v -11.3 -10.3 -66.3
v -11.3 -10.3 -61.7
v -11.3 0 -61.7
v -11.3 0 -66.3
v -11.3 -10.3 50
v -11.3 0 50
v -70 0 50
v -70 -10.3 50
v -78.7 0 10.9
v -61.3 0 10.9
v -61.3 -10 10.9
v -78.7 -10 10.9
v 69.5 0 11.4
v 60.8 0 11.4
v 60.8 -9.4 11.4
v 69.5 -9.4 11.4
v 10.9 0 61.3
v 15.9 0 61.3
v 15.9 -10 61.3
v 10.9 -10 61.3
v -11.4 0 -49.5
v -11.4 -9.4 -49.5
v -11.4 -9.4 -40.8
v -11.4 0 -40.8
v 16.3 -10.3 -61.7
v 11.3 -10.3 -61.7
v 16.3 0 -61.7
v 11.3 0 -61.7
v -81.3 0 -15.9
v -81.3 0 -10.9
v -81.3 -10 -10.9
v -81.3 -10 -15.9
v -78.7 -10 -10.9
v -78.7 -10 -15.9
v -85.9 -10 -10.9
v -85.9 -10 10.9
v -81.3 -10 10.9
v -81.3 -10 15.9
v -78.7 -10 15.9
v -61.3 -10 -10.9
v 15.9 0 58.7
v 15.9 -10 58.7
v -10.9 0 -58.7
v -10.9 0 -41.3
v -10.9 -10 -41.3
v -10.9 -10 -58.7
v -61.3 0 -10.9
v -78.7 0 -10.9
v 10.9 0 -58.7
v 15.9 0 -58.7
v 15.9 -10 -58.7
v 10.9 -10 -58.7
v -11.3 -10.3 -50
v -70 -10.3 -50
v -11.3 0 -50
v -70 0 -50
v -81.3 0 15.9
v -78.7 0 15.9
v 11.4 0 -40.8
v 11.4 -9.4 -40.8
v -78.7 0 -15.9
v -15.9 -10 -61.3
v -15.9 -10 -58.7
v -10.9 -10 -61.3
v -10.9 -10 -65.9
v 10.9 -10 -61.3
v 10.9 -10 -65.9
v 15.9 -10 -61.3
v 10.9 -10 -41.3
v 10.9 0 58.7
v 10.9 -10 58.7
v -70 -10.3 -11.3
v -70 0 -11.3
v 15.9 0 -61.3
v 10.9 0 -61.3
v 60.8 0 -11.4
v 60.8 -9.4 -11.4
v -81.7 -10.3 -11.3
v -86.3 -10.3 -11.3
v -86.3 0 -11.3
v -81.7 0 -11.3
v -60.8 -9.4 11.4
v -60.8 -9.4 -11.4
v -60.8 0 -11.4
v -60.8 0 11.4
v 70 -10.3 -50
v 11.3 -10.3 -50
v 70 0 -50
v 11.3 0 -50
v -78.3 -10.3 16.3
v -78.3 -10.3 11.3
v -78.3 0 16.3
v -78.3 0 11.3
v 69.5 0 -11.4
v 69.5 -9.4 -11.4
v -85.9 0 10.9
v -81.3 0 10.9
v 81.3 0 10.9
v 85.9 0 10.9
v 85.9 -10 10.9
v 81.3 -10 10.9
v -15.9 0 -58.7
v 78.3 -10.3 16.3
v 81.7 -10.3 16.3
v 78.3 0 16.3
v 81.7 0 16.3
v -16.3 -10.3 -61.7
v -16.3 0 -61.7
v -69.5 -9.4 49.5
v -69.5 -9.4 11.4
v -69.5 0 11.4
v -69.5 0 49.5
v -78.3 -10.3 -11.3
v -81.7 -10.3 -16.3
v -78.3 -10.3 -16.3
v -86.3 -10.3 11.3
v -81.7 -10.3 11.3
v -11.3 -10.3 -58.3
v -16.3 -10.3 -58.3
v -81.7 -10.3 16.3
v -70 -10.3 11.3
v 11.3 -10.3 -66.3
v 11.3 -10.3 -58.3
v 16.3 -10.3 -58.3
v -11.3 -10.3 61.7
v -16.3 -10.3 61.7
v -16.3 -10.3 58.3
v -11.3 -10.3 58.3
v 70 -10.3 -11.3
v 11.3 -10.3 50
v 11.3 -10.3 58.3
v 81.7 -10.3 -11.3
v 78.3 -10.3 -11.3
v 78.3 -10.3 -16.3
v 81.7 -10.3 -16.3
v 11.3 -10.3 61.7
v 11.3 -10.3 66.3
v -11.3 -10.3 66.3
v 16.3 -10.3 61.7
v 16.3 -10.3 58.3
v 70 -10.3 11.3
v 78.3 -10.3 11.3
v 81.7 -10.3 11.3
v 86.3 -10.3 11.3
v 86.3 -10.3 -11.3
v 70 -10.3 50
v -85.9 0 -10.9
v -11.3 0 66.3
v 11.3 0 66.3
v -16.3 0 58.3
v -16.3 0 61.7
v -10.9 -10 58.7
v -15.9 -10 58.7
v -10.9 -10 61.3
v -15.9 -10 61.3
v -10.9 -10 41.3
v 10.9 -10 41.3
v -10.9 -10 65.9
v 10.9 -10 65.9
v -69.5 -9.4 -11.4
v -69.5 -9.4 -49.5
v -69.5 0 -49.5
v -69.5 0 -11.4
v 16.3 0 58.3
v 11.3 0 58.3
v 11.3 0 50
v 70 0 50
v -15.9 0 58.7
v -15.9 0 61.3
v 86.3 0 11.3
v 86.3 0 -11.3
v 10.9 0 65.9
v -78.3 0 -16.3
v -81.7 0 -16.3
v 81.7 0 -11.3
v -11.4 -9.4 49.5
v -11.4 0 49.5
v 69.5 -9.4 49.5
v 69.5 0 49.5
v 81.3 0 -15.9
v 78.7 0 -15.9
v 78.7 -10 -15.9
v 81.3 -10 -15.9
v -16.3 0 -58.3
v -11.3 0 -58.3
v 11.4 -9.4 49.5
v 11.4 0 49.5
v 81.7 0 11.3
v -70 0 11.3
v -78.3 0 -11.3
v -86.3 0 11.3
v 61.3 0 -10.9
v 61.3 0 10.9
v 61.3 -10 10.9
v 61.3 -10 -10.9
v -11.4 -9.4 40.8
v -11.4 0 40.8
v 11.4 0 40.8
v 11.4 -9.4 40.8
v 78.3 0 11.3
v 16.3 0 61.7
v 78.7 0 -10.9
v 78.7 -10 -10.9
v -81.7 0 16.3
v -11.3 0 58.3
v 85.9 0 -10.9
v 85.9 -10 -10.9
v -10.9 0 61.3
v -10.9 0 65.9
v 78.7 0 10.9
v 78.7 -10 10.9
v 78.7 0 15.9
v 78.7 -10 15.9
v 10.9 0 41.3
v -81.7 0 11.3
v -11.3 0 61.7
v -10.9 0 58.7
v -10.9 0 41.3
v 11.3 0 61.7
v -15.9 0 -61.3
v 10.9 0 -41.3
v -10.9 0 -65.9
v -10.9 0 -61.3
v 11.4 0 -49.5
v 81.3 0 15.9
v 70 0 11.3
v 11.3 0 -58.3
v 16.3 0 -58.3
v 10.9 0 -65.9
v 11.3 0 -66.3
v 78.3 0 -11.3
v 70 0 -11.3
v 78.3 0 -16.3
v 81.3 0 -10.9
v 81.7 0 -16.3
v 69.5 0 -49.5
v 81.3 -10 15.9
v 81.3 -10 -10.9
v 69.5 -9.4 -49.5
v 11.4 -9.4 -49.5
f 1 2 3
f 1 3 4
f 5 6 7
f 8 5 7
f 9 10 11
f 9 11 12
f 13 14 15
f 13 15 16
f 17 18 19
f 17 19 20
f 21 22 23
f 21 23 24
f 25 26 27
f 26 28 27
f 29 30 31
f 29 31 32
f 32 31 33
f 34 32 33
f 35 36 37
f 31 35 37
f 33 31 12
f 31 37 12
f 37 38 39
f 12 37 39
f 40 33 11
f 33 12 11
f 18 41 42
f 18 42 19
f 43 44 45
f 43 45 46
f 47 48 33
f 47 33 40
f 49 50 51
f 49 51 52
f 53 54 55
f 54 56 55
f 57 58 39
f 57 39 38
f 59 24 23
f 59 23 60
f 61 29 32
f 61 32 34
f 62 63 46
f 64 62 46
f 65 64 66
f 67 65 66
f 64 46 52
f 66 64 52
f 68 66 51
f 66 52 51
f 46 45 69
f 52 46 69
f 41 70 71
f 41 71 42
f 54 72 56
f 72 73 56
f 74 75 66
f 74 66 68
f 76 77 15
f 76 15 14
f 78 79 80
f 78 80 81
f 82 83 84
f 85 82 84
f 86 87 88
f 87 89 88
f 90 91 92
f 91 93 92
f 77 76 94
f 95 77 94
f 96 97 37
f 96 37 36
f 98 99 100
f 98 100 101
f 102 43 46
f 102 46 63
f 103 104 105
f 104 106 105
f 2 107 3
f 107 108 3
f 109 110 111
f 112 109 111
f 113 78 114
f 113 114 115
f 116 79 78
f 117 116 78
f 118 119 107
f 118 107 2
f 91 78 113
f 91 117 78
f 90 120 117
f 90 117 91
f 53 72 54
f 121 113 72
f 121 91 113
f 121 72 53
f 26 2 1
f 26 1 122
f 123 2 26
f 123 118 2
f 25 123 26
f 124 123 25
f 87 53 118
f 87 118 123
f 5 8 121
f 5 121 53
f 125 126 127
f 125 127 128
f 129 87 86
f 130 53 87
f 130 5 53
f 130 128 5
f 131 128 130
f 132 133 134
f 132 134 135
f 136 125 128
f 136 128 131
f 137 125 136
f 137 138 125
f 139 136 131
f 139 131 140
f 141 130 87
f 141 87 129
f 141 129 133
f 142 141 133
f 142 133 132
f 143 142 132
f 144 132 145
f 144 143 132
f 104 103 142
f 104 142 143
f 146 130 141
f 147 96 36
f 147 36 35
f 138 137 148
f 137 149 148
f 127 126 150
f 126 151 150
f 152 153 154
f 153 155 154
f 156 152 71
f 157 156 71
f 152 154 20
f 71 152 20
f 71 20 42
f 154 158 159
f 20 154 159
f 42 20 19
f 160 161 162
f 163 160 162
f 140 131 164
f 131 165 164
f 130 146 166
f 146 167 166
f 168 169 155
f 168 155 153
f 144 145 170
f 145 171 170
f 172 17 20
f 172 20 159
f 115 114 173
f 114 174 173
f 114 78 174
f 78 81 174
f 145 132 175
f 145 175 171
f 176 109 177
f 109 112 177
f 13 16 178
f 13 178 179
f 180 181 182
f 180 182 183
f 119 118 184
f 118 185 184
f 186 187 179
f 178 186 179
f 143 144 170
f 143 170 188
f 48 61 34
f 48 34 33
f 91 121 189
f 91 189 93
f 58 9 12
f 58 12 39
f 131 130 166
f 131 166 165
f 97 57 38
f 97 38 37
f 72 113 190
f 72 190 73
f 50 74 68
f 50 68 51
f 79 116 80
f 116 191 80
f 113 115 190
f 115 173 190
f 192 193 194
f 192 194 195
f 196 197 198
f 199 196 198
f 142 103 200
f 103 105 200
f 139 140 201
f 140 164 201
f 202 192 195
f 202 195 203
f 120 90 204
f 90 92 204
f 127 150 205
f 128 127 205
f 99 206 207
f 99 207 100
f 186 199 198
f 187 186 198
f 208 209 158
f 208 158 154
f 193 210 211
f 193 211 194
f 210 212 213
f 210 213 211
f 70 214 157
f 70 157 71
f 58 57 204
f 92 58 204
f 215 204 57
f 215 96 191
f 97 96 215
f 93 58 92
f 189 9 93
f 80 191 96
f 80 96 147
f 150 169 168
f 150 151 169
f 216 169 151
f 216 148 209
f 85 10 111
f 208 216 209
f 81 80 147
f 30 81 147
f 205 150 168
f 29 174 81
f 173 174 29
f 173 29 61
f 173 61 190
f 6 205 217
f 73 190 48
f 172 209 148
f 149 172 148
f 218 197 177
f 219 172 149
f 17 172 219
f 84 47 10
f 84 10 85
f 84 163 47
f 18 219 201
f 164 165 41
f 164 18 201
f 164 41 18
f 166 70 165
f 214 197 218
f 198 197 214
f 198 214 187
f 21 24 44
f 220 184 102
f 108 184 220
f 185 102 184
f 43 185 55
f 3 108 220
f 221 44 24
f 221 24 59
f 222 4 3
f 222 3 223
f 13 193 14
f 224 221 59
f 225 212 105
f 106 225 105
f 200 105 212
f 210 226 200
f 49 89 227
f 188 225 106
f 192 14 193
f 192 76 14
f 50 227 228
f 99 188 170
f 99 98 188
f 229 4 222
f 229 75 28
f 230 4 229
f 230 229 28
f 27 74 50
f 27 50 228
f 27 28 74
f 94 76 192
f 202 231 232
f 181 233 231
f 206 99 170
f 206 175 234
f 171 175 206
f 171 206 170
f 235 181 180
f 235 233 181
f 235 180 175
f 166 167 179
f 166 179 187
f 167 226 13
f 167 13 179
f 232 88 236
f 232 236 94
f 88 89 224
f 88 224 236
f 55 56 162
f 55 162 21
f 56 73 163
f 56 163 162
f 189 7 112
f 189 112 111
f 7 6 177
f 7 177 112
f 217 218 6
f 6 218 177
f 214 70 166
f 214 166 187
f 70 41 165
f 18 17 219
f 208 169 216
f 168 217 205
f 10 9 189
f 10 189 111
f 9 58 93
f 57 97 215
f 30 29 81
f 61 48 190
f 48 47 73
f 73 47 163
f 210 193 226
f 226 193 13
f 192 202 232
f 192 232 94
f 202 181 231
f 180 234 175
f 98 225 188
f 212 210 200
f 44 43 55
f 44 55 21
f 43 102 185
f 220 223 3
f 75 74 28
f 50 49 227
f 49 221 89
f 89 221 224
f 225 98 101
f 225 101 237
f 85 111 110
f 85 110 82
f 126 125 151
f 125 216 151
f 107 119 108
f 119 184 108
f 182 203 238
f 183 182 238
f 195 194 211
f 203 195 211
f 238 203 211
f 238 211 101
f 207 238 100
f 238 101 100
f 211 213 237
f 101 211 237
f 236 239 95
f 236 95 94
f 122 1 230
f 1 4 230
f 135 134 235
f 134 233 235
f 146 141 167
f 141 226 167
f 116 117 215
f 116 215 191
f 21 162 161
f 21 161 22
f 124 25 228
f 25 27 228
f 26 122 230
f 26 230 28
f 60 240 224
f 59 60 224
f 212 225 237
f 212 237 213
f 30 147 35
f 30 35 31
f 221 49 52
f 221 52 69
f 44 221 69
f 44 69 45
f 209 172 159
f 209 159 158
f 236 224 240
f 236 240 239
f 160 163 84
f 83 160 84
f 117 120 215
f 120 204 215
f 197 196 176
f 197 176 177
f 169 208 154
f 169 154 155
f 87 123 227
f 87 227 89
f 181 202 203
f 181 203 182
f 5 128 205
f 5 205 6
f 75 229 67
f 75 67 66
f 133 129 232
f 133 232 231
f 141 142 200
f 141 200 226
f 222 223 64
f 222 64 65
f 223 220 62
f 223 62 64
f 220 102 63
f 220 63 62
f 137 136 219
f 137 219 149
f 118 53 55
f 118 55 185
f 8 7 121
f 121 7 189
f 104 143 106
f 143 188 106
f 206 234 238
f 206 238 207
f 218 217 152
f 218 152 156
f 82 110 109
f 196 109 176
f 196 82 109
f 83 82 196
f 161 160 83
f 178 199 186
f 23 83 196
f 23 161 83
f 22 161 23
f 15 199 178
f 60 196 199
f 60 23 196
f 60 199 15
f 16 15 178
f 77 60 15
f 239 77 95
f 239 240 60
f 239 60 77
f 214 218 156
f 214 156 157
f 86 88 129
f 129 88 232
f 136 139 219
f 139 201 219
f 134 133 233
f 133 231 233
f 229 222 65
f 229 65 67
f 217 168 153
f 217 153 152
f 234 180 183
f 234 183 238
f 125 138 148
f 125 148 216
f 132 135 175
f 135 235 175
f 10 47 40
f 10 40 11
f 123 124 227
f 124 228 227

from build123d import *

# Parameters (mm, degrees)
SALIENTE_EXTRUIR1_DEPTH = 10
VACIADO2_START          = -40.8
VACIADO2_OUTLINE_W      = 121.6
VACIADO2_OUTLINE_H      = 9.4
VACIADO2_DEPTH          = 81.6
VACIADO2_START_2        = -49.5
VACIADO2_2_OUTLINE_W    = 49.4
VACIADO2_2_OUTLINE_H    = 9.4
VACIADO2_2_DEPTH        = 99
VACIADO2_3_OUTLINE_W    = 8.7
VACIADO2_3_OUTLINE_H    = 9.4
VACIADO2_3_DEPTH        = 38.1
VACIADO2_START_3        = 11.4
VACIADO2_4_OUTLINE_W    = 8.7
VACIADO2_4_OUTLINE_H    = 9.4
VACIADO2_4_DEPTH        = 38.1
SALIENTE_EXTRUIR6_DEPTH = 0.3


# Read off the part's stored shape, not the designer's step: Vaciado2
with BuildPart() as part:
    # Croquis1 → Saliente-Extruir1 (new body)
    with BuildSketch(Plane(origin=(0, 0, 0), x_dir=(1, 0, 0), z_dir=(0, 1, 0))):
        Polygon((-11.3, -50), (-11.3, -58.3), (-16.3, -58.3), (-16.3, -61.7), (-11.3, -61.7), (-11.3, -66.3), (11.3, -66.3), (11.3, -61.7), (16.3, -61.7), (16.3, -58.3), (11.3, -58.3), (11.3, -50), (70, -50), (70, -11.3), (78.3, -11.3), (78.3, -16.3), (81.7, -16.3), (81.7, -11.3), (86.3, -11.3), (86.3, 11.3), (81.7, 11.3), (81.7, 16.3), (78.3, 16.3), (78.3, 11.3), (70, 11.3), (70, 50), (11.3, 50), (11.3, 58.3), (16.3, 58.3), (16.3, 61.7), (11.3, 61.7), (11.3, 66.3), (-11.3, 66.3), (-11.3, 61.7), (-16.3, 61.7), (-16.3, 58.3), (-11.3, 58.3), (-11.3, 50), (-70, 50), (-70, 11.3), (-78.3, 11.3), (-78.3, 16.3), (-81.7, 16.3), (-81.7, 11.3), (-86.3, 11.3), (-86.3, -11.3), (-81.7, -11.3), (-81.7, -16.3), (-78.3, -16.3), (-78.3, -11.3), (-70, -11.3), (-70, -50), align=None)
        Polygon((-10.9, 41.3), (-10.9, 58.7), (-15.9, 58.7), (-15.9, 61.3), (-10.9, 61.3), (-10.9, 65.9), (10.9, 65.9), (10.9, 61.3), (15.9, 61.3), (15.9, 58.7), (10.9, 58.7), (10.9, 41.3), align=None, mode=Mode.SUBTRACT)
        Polygon((-10.9, -41.3), (10.9, -41.3), (10.9, -58.7), (15.9, -58.7), (15.9, -61.3), (10.9, -61.3), (10.9, -65.9), (-10.9, -65.9), (-10.9, -61.3), (-15.9, -61.3), (-15.9, -58.7), (-10.9, -58.7), align=None, mode=Mode.SUBTRACT)
        Polygon((-61.3, -10.9), (-78.7, -10.9), (-78.7, -15.9), (-81.3, -15.9), (-81.3, -10.9), (-85.9, -10.9), (-85.9, 10.9), (-81.3, 10.9), (-81.3, 15.9), (-78.7, 15.9), (-78.7, 10.9), (-61.3, 10.9), align=None, mode=Mode.SUBTRACT)
        Polygon((61.3, -10.9), (61.3, 10.9), (78.7, 10.9), (78.7, 15.9), (81.3, 15.9), (81.3, 10.9), (85.9, 10.9), (85.9, -10.9), (81.3, -10.9), (81.3, -15.9), (78.7, -15.9), (78.7, -10.9), align=None, mode=Mode.SUBTRACT)
    extrude(amount=-SALIENTE_EXTRUIR1_DEPTH)

    # Vaciado2 outline → Vaciado2 (cut)
    with BuildSketch(Plane.XY.offset(VACIADO2_START)):
        with Locations((0, -4.7)):
            Rectangle(VACIADO2_OUTLINE_W, VACIADO2_OUTLINE_H)
    extrude(amount=VACIADO2_DEPTH, mode=Mode.SUBTRACT)

    # Vaciado2 2 outline → Vaciado2 2 (cut)
    with BuildSketch(Plane.XY.offset(VACIADO2_START_2)):
        with Locations((-36.1, -4.7)):
            Rectangle(VACIADO2_2_OUTLINE_W, VACIADO2_2_OUTLINE_H)
        with Locations((36.1, -4.7)):
            Rectangle(VACIADO2_2_OUTLINE_W, VACIADO2_2_OUTLINE_H)
    extrude(amount=VACIADO2_2_DEPTH, mode=Mode.SUBTRACT)

    # Vaciado2 3 outline → Vaciado2 3 (cut)
    with BuildSketch(Plane.XY.offset(VACIADO2_START_2)):
        with Locations((-65.15, -4.7)):
            Rectangle(VACIADO2_3_OUTLINE_W, VACIADO2_3_OUTLINE_H)
        with Locations((65.15, -4.7)):
            Rectangle(VACIADO2_3_OUTLINE_W, VACIADO2_3_OUTLINE_H)
    extrude(amount=VACIADO2_3_DEPTH, mode=Mode.SUBTRACT)

    # Vaciado2 4 outline → Vaciado2 4 (cut)
    with BuildSketch(Plane.XY.offset(VACIADO2_START_3)):
        with Locations((-65.15, -4.7)):
            Rectangle(VACIADO2_4_OUTLINE_W, VACIADO2_4_OUTLINE_H)
        with Locations((65.15, -4.7)):
            Rectangle(VACIADO2_4_OUTLINE_W, VACIADO2_4_OUTLINE_H)
    extrude(amount=VACIADO2_4_DEPTH, mode=Mode.SUBTRACT)

    # Croquis4 → Saliente-Extruir6 (add)
    with BuildSketch(Plane.XZ.offset(10)):
        Polygon((-11.3, 50), (-70, 50), (-70, 11.3), (-78.3, 11.3), (-78.3, 16.3), (-81.7, 16.3), (-81.7, 11.3), (-86.3, 11.3), (-86.3, -11.3), (-81.7, -11.3), (-81.7, -16.3), (-78.3, -16.3), (-78.3, -11.3), (-70, -11.3), (-70, -50), (-11.3, -50), (-11.3, -58.3), (-16.3, -58.3), (-16.3, -61.7), (-11.3, -61.7), (-11.3, -66.3), (11.3, -66.3), (11.3, -61.7), (16.3, -61.7), (16.3, -58.3), (11.3, -58.3), (11.3, -50), (70, -50), (70, -11.3), (78.3, -11.3), (78.3, -16.3), (81.7, -16.3), (81.7, -11.3), (86.3, -11.3), (86.3, 11.3), (81.7, 11.3), (81.7, 16.3), (78.3, 16.3), (78.3, 11.3), (70, 11.3), (70, 50), (11.3, 50), (11.3, 58.3), (16.3, 58.3), (16.3, 61.7), (11.3, 61.7), (11.3, 66.3), (-11.3, 66.3), (-11.3, 61.7), (-16.3, 61.7), (-16.3, 58.3), (-11.3, 58.3), align=None)
    extrude(amount=SALIENTE_EXTRUIR6_DEPTH)


solid = part.part
